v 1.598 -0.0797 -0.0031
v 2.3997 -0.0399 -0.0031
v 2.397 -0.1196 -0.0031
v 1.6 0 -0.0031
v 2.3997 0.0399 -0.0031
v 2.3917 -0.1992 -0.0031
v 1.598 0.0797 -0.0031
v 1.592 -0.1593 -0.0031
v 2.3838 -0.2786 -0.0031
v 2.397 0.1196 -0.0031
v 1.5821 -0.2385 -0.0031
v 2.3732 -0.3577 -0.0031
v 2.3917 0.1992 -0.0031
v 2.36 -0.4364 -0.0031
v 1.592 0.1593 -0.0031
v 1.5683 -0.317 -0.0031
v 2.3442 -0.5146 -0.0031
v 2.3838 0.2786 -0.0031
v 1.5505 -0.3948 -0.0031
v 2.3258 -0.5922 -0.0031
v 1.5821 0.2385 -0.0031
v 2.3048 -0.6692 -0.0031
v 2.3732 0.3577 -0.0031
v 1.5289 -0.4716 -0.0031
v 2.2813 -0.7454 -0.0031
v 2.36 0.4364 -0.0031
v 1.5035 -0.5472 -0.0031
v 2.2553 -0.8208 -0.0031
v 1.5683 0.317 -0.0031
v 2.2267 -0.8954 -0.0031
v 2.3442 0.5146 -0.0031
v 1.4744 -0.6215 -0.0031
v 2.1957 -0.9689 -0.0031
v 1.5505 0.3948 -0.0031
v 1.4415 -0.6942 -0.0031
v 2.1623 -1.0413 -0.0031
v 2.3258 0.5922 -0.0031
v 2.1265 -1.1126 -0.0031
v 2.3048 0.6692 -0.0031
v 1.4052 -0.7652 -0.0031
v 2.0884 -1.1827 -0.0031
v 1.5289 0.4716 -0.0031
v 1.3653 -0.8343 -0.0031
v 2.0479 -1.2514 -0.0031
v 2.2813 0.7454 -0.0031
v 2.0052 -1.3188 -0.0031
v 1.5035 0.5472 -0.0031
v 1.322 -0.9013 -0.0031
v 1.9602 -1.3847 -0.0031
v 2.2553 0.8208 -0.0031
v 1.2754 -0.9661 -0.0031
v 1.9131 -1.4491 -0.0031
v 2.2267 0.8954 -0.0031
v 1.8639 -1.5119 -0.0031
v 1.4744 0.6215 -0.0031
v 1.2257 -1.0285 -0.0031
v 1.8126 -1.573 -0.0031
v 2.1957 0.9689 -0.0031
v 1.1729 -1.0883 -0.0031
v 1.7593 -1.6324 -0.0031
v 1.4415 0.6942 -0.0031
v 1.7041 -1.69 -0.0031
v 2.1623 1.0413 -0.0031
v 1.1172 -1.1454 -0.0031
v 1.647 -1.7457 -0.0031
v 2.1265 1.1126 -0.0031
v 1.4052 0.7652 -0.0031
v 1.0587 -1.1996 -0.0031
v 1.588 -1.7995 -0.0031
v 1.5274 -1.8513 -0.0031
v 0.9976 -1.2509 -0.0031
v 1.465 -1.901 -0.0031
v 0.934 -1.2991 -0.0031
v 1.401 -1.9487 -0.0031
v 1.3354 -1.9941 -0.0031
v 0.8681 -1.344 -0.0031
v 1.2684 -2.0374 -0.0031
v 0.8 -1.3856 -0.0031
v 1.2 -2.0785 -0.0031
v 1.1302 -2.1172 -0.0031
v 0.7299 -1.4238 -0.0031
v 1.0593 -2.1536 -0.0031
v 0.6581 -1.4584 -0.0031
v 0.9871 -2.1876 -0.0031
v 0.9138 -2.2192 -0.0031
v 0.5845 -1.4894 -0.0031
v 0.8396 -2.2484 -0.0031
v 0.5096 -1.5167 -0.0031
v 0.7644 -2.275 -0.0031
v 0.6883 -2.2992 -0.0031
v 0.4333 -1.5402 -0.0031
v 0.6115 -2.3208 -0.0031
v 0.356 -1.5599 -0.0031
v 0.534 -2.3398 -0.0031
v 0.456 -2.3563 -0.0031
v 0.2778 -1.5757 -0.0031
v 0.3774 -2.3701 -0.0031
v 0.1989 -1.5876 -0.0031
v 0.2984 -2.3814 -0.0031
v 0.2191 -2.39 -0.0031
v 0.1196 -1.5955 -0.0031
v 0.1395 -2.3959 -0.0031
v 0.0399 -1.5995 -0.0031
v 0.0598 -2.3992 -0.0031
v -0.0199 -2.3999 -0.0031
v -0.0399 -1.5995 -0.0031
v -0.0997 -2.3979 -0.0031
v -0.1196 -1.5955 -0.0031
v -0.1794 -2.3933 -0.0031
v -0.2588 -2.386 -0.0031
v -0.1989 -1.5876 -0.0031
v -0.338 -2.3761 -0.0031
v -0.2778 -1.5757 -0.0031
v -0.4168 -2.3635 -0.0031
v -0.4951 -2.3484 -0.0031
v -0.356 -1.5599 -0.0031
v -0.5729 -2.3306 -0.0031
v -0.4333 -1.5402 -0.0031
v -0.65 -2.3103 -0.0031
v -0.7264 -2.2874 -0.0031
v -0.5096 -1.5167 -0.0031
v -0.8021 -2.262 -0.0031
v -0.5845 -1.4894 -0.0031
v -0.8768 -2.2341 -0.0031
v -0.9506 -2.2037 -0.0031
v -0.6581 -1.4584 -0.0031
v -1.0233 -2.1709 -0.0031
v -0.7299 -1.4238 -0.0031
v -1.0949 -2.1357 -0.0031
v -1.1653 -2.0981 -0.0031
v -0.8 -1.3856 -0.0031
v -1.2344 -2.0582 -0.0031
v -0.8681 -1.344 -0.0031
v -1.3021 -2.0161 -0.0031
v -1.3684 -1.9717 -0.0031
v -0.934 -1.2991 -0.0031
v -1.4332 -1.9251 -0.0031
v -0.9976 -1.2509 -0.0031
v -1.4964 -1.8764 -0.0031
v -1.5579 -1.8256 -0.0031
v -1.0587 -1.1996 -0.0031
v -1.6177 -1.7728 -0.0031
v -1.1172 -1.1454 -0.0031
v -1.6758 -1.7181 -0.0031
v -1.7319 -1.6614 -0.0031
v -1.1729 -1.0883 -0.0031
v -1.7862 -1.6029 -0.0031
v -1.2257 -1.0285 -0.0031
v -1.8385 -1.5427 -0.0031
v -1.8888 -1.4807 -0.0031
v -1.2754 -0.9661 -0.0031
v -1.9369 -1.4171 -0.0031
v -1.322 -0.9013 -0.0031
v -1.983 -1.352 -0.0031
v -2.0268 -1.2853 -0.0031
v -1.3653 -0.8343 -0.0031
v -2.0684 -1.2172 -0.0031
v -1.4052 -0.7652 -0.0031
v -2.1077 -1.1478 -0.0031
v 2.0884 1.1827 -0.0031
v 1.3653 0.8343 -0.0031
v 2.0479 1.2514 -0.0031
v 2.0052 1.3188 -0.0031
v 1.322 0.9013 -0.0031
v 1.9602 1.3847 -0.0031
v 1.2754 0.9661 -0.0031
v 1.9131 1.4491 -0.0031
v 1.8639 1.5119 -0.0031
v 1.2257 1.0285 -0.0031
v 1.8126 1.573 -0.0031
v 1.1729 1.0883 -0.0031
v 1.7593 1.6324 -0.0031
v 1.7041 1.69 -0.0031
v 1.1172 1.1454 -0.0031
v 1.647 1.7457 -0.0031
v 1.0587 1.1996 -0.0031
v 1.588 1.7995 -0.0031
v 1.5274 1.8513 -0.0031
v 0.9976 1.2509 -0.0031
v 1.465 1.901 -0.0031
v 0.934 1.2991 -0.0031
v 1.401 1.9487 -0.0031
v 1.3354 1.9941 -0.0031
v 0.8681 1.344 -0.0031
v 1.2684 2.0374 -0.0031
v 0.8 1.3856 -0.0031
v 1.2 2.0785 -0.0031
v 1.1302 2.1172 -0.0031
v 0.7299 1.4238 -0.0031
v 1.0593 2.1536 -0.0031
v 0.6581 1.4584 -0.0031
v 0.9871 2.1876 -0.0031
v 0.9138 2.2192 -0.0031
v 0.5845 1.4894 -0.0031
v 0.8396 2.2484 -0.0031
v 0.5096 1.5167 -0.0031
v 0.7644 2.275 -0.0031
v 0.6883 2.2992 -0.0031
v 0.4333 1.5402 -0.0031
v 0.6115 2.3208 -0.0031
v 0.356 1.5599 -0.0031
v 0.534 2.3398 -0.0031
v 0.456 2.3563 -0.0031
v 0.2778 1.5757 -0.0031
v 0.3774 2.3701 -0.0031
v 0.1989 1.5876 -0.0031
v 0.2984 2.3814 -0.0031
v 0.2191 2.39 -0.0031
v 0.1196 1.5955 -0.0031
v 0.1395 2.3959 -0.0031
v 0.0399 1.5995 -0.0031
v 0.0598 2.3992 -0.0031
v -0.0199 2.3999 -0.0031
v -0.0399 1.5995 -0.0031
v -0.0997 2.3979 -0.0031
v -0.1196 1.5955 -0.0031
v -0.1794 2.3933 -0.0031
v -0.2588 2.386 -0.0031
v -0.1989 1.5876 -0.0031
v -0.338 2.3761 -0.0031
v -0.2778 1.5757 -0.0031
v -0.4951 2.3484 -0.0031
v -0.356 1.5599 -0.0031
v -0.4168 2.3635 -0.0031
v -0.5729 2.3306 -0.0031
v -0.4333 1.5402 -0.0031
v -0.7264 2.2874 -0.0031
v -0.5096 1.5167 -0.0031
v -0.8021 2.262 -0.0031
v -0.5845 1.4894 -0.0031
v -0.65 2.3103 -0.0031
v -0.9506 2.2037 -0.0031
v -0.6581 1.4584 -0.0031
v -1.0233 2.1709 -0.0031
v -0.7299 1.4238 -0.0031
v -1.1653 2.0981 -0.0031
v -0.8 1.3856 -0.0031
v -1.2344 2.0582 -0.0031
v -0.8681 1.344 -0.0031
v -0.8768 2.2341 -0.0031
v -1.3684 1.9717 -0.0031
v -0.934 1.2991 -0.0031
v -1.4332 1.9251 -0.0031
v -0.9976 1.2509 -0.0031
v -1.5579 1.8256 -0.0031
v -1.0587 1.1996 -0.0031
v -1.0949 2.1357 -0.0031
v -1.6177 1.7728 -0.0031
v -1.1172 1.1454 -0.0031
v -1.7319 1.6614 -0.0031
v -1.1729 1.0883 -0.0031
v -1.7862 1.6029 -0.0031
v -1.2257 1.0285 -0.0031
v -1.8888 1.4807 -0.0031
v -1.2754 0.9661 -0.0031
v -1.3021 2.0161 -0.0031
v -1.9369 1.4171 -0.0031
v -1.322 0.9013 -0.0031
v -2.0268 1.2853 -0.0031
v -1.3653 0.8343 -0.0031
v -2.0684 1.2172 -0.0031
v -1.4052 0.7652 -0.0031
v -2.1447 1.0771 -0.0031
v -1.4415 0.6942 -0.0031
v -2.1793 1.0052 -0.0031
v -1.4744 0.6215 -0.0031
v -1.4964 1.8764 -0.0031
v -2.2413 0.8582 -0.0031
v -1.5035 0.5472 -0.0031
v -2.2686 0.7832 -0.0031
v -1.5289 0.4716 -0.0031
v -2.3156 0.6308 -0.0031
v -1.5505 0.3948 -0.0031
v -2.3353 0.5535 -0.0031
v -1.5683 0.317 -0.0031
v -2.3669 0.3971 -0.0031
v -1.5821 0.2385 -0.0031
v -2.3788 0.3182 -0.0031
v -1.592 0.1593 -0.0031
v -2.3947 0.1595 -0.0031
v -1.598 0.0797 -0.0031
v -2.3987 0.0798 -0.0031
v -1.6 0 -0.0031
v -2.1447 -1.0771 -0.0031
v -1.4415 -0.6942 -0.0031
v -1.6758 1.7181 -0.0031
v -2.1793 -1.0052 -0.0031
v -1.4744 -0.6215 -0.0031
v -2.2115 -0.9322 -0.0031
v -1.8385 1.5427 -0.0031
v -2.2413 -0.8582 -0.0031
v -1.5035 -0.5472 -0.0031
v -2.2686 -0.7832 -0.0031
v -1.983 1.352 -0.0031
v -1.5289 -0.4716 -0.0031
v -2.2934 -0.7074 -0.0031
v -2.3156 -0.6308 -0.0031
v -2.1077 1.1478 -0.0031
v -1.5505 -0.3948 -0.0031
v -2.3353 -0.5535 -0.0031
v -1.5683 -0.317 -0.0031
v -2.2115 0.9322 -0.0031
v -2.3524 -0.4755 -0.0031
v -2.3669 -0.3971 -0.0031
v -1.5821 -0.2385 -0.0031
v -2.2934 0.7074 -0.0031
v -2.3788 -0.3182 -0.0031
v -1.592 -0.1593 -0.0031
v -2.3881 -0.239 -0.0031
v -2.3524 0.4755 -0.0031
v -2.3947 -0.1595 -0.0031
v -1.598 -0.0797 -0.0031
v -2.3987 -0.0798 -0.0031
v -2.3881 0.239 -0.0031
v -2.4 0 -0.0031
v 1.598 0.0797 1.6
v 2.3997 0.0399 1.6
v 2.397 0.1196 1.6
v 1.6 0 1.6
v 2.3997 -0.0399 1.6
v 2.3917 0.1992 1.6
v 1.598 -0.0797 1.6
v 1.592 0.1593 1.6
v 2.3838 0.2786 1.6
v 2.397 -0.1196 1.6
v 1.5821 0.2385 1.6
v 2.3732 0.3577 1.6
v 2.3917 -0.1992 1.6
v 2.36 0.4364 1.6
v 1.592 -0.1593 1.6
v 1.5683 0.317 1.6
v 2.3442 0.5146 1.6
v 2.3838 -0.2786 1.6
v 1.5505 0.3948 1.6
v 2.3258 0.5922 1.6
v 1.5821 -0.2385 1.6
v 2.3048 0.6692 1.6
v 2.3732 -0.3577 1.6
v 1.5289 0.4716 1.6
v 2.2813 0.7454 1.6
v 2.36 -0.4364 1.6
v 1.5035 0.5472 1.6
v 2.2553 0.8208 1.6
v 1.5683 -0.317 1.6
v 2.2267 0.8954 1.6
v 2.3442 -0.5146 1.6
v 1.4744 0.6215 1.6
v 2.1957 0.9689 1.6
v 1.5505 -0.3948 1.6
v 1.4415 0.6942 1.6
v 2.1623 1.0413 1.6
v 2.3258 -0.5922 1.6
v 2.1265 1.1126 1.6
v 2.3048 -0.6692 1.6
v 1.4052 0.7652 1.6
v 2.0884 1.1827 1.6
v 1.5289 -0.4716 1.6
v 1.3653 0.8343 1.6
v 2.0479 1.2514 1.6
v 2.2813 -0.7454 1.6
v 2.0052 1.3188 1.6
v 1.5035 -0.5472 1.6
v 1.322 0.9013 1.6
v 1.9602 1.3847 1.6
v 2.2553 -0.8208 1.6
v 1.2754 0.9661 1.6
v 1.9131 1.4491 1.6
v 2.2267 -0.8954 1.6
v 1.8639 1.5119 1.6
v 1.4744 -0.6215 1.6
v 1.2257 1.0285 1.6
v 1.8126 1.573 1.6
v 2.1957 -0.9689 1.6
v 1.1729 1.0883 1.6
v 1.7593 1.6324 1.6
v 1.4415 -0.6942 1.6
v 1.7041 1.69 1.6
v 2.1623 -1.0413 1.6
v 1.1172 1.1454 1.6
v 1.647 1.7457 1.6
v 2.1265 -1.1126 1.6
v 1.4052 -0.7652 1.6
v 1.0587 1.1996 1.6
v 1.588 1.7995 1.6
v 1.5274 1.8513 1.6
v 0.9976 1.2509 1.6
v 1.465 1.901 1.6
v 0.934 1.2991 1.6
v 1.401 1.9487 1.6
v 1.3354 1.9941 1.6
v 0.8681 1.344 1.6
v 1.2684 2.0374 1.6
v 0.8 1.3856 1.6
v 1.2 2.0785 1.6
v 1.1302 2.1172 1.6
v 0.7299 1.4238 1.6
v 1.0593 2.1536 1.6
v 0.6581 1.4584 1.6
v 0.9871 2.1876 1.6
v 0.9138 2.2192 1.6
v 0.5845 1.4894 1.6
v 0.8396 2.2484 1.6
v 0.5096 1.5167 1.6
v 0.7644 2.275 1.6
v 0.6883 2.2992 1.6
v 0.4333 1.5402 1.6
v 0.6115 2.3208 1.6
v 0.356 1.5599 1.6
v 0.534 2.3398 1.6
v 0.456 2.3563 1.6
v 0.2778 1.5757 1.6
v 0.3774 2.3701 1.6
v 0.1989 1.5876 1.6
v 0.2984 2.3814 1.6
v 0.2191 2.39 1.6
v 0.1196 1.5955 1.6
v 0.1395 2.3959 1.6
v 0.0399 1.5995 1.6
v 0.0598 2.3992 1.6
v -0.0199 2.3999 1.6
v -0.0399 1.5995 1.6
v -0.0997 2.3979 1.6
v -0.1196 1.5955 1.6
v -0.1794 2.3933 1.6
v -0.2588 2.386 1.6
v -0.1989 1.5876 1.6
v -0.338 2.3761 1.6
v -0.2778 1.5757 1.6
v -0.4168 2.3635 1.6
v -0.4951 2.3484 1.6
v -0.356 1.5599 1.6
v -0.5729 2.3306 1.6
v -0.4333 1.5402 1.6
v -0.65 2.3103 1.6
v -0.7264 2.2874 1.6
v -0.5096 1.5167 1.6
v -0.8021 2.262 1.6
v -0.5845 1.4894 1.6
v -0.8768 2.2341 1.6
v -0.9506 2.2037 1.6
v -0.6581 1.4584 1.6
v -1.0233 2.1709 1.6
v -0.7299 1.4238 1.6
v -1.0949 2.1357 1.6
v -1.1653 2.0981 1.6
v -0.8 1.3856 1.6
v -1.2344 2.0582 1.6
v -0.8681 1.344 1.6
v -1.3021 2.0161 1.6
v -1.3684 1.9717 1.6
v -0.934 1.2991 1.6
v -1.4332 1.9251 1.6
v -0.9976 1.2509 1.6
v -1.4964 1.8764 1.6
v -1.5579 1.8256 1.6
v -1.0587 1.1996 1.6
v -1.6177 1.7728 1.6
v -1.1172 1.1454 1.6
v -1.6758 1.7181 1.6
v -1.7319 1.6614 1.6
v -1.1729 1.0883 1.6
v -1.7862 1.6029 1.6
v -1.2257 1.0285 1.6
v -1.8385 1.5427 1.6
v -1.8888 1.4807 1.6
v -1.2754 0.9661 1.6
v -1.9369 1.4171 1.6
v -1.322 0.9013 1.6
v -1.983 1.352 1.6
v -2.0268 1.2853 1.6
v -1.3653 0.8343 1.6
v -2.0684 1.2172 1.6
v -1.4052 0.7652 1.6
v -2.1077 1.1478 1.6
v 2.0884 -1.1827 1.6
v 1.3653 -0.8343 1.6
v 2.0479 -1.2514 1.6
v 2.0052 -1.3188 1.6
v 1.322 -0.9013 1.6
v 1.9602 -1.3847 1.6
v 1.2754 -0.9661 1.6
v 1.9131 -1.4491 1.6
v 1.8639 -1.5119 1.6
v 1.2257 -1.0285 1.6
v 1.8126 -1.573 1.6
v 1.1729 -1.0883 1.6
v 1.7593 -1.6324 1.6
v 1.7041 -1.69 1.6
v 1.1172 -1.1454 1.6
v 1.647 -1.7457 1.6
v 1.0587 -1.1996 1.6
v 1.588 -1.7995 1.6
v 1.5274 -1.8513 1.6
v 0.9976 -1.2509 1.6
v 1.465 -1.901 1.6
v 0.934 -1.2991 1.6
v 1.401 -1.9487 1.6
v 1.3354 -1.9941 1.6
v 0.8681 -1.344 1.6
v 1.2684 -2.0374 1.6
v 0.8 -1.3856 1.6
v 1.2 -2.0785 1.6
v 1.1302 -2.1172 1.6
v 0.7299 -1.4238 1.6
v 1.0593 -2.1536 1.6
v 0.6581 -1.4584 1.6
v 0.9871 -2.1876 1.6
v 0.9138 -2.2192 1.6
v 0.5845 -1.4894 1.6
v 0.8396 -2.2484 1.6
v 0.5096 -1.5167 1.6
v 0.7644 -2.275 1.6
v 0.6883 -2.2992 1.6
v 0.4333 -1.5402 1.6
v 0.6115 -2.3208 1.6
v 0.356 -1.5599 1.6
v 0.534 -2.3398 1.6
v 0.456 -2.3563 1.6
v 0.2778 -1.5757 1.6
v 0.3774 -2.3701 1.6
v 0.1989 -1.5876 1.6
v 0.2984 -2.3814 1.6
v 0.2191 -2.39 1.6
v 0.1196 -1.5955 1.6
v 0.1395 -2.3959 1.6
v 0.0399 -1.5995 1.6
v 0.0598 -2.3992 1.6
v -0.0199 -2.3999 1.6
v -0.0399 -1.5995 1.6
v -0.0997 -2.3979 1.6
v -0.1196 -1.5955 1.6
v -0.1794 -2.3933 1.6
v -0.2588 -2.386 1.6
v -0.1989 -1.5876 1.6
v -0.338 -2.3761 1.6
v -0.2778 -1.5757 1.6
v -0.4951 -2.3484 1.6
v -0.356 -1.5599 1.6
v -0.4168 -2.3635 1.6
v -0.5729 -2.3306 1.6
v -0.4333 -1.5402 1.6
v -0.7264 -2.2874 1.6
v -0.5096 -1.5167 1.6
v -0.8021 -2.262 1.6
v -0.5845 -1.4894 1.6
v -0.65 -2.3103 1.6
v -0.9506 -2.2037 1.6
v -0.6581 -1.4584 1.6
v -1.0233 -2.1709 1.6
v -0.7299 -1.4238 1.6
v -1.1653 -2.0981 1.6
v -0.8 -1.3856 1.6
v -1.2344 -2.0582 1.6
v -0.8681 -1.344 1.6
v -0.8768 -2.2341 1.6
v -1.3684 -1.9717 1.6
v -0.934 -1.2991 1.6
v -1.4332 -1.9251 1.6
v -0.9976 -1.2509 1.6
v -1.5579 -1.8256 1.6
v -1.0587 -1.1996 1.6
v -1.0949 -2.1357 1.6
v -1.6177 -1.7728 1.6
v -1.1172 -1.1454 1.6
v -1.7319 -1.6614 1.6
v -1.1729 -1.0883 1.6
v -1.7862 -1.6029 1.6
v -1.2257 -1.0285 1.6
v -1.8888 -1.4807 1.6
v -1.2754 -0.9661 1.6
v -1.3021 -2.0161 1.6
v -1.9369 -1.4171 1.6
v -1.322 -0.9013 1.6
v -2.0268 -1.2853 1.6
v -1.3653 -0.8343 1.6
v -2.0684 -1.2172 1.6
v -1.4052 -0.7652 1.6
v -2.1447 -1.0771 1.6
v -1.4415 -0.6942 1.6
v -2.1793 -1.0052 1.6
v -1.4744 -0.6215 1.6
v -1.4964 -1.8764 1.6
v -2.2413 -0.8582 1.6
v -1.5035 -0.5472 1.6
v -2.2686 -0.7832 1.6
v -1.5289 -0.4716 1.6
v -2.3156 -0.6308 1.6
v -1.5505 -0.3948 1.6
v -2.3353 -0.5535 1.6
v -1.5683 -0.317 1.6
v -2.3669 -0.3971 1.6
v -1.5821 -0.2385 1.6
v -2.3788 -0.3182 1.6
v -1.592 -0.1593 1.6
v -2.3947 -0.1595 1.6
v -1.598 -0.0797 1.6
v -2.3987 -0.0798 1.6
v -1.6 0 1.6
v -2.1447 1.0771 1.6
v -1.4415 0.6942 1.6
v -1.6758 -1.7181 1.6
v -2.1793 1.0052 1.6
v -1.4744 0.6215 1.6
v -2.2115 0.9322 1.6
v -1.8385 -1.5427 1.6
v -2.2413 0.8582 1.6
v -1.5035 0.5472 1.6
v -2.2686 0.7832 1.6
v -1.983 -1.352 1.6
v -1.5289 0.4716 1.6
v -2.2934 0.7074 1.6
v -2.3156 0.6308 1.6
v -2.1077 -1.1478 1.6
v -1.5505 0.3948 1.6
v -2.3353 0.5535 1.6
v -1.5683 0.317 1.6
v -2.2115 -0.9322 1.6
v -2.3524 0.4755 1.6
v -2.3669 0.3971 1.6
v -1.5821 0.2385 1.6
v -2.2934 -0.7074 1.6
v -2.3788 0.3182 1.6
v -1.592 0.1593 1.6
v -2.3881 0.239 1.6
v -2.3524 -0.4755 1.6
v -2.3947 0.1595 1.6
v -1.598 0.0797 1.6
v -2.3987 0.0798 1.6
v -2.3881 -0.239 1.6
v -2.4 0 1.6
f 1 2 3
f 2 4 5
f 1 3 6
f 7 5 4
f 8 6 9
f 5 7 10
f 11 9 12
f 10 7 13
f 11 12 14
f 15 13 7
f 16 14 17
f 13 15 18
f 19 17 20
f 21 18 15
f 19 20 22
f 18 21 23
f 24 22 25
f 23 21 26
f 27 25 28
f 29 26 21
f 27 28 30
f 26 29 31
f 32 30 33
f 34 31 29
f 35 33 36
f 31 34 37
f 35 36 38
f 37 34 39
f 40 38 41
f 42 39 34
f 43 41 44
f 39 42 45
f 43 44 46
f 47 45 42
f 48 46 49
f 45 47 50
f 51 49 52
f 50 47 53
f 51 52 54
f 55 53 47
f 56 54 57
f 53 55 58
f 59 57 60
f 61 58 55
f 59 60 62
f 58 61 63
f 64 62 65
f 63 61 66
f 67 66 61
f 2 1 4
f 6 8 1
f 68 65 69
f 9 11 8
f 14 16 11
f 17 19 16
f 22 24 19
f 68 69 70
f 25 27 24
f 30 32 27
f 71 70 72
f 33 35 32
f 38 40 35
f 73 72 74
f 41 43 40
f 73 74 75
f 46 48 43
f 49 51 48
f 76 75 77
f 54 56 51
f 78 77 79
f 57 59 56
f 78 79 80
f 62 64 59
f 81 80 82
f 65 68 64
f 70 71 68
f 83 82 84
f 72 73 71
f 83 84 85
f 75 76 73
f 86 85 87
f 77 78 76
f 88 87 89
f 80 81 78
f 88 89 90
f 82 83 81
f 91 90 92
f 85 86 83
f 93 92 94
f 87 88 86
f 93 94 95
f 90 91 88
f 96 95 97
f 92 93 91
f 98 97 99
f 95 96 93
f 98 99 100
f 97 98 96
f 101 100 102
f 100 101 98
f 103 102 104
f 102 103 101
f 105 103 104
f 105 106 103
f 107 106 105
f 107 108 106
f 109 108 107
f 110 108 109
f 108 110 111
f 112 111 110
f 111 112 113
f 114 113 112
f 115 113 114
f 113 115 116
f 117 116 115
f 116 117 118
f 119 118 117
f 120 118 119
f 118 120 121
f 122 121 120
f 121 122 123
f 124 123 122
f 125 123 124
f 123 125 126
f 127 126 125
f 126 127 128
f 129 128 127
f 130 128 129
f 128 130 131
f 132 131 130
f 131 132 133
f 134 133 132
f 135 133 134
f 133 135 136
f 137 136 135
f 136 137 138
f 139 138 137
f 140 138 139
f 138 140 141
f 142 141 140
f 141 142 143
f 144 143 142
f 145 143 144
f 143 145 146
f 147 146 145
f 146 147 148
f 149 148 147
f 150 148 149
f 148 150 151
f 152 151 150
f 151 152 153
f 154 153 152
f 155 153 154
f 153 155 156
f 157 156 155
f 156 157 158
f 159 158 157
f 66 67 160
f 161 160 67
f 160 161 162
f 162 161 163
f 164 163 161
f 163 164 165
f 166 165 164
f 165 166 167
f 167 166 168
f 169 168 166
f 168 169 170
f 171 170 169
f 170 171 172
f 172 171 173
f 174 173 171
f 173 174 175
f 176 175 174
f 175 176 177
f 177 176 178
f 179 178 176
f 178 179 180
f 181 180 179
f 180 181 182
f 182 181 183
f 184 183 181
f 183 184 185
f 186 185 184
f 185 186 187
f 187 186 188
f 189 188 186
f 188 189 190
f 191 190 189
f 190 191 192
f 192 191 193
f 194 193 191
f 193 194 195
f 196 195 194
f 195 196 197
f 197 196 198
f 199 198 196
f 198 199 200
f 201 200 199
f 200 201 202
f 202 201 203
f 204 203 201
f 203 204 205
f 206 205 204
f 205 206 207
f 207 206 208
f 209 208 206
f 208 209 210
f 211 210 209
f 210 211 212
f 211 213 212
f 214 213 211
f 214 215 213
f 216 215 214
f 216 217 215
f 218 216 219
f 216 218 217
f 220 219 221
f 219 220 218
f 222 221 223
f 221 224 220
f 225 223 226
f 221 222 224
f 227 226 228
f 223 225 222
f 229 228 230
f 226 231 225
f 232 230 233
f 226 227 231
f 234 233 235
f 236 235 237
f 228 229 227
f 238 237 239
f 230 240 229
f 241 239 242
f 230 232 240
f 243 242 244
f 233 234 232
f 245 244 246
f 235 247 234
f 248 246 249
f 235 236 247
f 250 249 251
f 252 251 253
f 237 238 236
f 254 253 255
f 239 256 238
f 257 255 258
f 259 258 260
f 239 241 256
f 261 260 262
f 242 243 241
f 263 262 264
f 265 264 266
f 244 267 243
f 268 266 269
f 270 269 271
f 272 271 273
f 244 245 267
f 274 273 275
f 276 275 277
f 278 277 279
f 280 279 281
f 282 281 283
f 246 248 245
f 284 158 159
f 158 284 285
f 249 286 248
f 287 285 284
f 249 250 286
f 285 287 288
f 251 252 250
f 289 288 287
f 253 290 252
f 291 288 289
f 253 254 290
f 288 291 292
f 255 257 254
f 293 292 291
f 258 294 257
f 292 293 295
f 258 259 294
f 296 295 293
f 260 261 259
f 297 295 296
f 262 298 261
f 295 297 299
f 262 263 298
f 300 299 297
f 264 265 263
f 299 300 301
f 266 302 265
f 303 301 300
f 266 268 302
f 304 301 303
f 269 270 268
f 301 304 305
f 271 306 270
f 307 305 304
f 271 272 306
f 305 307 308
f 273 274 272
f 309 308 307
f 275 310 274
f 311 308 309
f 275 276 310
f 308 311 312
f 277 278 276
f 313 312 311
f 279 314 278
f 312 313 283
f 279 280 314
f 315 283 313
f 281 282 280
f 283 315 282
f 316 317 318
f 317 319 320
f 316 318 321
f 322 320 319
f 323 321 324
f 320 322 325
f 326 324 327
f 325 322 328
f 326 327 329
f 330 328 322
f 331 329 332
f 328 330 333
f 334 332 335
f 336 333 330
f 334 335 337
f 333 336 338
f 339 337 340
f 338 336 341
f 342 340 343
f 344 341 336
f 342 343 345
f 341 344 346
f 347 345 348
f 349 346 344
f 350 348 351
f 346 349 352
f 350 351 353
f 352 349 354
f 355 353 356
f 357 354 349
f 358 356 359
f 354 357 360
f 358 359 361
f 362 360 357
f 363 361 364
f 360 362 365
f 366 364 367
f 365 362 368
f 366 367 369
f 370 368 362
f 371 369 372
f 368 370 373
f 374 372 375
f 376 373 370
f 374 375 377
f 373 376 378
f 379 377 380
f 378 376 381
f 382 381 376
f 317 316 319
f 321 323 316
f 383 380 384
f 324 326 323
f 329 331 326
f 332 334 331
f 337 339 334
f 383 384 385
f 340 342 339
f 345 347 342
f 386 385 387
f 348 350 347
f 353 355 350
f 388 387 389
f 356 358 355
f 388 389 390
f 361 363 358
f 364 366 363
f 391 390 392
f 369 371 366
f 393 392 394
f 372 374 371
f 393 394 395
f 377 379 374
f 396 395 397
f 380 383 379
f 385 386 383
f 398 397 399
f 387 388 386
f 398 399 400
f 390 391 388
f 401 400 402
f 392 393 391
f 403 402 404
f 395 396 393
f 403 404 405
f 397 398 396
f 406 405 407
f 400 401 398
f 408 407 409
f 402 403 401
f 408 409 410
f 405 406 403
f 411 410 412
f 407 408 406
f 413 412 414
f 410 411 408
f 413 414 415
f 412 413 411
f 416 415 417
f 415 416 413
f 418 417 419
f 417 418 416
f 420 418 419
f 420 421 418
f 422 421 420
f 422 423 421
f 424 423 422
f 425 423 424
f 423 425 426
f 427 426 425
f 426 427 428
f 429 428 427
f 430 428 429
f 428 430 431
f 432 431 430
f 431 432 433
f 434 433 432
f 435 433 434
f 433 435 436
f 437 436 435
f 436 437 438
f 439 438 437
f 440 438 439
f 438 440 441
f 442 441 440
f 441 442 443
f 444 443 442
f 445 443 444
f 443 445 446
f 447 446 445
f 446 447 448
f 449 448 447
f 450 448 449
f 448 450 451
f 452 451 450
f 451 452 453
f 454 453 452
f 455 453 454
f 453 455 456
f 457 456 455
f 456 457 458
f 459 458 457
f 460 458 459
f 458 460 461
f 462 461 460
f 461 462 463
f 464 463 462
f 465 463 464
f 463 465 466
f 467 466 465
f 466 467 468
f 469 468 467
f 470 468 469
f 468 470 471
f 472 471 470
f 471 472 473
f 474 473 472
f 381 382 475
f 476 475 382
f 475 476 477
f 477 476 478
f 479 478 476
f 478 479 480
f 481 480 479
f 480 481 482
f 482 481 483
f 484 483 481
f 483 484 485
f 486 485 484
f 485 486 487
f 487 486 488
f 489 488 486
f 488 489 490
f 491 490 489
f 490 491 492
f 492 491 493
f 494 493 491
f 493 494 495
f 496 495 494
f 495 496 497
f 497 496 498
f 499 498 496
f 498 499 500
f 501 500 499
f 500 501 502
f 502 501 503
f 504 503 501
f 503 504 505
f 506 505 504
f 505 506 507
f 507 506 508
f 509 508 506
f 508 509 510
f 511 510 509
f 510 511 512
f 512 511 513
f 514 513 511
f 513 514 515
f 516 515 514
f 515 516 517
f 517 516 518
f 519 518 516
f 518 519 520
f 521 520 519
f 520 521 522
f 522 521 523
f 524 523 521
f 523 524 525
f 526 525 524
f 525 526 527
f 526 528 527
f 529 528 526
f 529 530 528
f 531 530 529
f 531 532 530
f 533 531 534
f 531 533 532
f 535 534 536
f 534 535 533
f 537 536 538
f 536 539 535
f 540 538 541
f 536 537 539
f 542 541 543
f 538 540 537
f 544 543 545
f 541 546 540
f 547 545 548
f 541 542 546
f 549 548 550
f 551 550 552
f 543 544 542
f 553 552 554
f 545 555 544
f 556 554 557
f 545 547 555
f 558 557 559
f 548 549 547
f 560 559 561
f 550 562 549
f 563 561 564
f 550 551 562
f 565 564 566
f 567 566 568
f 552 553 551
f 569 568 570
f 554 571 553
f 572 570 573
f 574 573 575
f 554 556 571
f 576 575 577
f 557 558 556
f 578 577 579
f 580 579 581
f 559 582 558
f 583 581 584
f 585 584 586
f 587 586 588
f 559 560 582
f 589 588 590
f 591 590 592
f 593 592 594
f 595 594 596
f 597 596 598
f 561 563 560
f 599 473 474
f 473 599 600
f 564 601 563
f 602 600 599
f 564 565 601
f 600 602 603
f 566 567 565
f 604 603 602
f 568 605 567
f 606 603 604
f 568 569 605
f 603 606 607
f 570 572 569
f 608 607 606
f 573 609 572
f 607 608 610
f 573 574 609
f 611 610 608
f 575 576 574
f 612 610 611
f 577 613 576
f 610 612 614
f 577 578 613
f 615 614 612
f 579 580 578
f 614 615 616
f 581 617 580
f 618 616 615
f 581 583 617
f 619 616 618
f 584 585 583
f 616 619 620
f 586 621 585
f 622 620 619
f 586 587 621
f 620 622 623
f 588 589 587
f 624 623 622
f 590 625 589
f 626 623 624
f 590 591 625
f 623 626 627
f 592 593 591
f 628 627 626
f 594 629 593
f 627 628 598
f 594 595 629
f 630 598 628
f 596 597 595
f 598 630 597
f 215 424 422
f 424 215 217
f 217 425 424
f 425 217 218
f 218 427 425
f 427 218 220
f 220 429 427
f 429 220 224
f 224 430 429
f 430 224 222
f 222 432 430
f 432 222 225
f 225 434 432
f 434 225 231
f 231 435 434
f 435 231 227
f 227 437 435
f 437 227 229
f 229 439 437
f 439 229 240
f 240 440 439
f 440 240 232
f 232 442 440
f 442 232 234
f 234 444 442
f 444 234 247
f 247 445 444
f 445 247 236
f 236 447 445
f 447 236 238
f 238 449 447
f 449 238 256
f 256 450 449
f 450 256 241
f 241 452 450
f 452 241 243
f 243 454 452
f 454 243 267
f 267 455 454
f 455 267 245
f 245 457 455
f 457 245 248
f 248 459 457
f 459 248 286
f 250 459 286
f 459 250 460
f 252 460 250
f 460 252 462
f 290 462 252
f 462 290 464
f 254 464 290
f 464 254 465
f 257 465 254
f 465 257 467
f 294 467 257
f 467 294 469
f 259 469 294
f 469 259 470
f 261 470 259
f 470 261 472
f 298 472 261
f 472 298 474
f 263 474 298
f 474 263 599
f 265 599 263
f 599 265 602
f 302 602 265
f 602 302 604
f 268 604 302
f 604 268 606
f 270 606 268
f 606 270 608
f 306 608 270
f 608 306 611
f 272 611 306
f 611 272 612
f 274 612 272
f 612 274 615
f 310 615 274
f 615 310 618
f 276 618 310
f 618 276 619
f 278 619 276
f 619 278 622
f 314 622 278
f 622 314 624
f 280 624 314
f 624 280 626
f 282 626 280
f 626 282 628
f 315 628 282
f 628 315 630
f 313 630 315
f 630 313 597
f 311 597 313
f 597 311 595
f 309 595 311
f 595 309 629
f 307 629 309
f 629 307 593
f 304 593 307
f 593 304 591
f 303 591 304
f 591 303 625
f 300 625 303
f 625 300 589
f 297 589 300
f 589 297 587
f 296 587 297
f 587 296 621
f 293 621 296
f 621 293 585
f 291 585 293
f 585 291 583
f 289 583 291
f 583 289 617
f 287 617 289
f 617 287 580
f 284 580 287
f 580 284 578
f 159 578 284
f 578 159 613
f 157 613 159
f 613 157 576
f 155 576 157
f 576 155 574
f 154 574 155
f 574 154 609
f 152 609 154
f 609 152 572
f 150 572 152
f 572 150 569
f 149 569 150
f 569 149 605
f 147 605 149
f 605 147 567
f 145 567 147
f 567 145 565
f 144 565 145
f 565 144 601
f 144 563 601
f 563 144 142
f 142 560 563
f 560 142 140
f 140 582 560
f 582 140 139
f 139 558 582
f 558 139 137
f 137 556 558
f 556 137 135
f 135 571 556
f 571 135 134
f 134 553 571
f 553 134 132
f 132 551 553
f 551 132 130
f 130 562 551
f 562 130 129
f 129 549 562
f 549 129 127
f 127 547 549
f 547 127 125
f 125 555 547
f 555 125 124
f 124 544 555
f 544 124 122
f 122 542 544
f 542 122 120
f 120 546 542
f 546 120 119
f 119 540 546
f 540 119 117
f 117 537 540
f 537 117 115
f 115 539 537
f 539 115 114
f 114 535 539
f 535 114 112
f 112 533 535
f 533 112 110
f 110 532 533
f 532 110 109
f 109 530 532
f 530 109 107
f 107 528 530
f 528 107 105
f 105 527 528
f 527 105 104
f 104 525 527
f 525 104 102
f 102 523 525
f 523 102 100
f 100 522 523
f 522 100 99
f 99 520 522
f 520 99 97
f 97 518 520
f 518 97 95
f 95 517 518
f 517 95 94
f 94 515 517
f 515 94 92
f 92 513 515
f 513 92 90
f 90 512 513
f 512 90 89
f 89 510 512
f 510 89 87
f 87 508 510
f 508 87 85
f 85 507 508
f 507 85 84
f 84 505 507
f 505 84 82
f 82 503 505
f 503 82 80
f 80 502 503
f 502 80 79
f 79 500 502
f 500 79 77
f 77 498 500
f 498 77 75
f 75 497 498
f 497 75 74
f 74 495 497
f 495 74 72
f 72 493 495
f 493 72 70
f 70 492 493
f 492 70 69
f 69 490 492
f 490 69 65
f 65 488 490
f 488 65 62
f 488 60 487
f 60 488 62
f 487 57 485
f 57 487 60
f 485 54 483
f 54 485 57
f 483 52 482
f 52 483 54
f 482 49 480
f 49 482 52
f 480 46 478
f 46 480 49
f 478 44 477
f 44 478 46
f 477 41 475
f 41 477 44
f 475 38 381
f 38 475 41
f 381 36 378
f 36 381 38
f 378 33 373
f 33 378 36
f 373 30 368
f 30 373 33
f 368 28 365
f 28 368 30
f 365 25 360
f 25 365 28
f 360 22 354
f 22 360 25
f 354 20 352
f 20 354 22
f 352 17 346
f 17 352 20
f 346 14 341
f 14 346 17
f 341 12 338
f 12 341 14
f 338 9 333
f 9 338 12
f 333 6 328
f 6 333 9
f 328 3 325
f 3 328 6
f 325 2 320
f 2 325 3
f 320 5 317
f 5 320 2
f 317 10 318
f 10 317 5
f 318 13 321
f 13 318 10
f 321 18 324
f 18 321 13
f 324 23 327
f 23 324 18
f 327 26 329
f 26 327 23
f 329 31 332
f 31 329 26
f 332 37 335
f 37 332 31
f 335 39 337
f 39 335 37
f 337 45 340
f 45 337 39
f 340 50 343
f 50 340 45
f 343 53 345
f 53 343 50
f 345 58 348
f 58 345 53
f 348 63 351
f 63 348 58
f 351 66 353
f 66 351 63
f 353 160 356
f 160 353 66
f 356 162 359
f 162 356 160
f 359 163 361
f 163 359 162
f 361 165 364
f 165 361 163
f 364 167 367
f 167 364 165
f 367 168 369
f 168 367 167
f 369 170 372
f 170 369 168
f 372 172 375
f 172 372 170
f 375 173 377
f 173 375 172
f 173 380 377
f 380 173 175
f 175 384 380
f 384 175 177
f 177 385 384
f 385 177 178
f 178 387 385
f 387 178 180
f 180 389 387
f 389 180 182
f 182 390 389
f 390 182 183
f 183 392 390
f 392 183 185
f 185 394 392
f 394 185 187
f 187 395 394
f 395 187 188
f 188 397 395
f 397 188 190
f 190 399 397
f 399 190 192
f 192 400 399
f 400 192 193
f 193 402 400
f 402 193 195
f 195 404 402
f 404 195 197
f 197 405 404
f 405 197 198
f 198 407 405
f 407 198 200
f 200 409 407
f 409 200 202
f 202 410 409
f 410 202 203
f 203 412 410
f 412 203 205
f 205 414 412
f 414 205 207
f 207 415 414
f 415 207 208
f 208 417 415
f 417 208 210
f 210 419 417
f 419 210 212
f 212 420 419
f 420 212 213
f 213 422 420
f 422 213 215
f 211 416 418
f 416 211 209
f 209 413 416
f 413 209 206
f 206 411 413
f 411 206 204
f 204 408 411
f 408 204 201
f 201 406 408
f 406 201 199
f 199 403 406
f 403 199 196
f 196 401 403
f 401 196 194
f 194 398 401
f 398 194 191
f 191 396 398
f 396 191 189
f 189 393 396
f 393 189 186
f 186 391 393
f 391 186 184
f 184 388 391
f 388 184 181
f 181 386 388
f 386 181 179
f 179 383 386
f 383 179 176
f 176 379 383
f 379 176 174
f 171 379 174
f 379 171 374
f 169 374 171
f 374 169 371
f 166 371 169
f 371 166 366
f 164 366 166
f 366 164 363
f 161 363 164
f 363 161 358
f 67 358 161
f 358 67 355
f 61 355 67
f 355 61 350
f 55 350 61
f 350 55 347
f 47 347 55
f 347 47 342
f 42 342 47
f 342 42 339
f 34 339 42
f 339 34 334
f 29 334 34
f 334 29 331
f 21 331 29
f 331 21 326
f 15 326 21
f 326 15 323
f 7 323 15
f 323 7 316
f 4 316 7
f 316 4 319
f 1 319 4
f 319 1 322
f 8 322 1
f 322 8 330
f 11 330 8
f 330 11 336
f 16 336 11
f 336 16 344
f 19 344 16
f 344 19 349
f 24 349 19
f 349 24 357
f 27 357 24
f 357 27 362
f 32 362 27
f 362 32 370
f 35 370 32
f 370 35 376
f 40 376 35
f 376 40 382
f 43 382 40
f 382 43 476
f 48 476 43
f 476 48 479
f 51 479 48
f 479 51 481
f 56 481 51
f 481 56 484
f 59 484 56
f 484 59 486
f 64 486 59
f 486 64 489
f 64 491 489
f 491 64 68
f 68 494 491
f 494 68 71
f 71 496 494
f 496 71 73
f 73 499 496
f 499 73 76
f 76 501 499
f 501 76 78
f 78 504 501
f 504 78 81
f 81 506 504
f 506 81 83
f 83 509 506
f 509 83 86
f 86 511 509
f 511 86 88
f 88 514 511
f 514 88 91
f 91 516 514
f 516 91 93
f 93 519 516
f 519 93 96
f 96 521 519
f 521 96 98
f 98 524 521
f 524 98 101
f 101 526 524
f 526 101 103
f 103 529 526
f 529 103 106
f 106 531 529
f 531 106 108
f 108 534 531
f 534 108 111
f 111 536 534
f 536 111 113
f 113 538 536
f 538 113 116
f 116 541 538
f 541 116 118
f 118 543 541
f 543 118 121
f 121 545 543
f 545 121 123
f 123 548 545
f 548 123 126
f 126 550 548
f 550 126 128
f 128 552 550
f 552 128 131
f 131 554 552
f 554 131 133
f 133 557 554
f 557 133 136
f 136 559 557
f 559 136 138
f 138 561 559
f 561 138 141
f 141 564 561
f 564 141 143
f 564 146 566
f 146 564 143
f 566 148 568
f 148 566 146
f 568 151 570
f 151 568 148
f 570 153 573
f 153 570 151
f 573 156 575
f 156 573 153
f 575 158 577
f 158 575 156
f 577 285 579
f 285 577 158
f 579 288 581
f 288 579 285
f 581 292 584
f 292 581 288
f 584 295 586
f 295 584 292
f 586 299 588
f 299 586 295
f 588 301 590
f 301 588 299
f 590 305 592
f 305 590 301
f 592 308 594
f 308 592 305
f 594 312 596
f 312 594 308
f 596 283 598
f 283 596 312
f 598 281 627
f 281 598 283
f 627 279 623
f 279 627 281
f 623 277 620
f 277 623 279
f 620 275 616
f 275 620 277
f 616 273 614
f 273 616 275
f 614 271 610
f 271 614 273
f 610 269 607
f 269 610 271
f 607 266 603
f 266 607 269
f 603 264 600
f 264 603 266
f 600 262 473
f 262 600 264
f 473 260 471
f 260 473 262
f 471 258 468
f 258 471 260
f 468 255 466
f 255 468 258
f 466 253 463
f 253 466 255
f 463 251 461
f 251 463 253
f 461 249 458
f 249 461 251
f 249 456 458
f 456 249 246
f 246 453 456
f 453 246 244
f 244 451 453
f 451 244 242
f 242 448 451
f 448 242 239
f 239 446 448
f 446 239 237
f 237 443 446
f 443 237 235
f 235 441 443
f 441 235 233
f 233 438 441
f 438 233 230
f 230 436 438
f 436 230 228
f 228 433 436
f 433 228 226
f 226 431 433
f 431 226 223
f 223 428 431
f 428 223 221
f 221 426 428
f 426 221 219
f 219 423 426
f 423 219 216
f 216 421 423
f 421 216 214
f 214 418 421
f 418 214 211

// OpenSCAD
use <../lib.scad>
use <3626cp8b.scad>
$fa=1; $fs=0.2;
function ldraw_lib__90787(realsolid=false) = [
// 0 =Minifig Head Brown Eyebrows, Freckles, Open Smile Pattern (Hollow Stud)
// 0 Name: 90787.dat
// 0 Author: Howard Lande [HowardLande]
// 0 !LDRAW_ORG Part Alias UPDATE 2022-01
// 0 !LICENSE Licensed under CC BY 2.0 and CC BY 4.0 : see CAreadme.txt
// 
// 0 BFC CERTIFY CCW
  [0,"BFC","CERTIFY"],
  [0,"BFC","CCW"],
// 
// 0 !HISTORY 2016-03-26 [MMR1988] Fixed dependency
// 0 !HISTORY 2022-01-14 [PTadmin] Official Update 2022-01
// 
// 
// 1 16 0 0 0 1 0 0 0 1 0 0 0 1 3626cp8b.dat
  [1,16,0,0,0,1,0,0,0,1,0,0,0,1, ldraw_lib__3626cp8b(realsolid)],
];
module ldraw_lib__90787(step=0, col=false, unit=2/5, alt=false, line=0.2, solid=!$preview)
    makepoly(ldraw_lib__90787(solid), step=step, col=col, unit=unit, alt=alt, line=line, solid=solid);
ldraw_lib__90787(line=0.2);
